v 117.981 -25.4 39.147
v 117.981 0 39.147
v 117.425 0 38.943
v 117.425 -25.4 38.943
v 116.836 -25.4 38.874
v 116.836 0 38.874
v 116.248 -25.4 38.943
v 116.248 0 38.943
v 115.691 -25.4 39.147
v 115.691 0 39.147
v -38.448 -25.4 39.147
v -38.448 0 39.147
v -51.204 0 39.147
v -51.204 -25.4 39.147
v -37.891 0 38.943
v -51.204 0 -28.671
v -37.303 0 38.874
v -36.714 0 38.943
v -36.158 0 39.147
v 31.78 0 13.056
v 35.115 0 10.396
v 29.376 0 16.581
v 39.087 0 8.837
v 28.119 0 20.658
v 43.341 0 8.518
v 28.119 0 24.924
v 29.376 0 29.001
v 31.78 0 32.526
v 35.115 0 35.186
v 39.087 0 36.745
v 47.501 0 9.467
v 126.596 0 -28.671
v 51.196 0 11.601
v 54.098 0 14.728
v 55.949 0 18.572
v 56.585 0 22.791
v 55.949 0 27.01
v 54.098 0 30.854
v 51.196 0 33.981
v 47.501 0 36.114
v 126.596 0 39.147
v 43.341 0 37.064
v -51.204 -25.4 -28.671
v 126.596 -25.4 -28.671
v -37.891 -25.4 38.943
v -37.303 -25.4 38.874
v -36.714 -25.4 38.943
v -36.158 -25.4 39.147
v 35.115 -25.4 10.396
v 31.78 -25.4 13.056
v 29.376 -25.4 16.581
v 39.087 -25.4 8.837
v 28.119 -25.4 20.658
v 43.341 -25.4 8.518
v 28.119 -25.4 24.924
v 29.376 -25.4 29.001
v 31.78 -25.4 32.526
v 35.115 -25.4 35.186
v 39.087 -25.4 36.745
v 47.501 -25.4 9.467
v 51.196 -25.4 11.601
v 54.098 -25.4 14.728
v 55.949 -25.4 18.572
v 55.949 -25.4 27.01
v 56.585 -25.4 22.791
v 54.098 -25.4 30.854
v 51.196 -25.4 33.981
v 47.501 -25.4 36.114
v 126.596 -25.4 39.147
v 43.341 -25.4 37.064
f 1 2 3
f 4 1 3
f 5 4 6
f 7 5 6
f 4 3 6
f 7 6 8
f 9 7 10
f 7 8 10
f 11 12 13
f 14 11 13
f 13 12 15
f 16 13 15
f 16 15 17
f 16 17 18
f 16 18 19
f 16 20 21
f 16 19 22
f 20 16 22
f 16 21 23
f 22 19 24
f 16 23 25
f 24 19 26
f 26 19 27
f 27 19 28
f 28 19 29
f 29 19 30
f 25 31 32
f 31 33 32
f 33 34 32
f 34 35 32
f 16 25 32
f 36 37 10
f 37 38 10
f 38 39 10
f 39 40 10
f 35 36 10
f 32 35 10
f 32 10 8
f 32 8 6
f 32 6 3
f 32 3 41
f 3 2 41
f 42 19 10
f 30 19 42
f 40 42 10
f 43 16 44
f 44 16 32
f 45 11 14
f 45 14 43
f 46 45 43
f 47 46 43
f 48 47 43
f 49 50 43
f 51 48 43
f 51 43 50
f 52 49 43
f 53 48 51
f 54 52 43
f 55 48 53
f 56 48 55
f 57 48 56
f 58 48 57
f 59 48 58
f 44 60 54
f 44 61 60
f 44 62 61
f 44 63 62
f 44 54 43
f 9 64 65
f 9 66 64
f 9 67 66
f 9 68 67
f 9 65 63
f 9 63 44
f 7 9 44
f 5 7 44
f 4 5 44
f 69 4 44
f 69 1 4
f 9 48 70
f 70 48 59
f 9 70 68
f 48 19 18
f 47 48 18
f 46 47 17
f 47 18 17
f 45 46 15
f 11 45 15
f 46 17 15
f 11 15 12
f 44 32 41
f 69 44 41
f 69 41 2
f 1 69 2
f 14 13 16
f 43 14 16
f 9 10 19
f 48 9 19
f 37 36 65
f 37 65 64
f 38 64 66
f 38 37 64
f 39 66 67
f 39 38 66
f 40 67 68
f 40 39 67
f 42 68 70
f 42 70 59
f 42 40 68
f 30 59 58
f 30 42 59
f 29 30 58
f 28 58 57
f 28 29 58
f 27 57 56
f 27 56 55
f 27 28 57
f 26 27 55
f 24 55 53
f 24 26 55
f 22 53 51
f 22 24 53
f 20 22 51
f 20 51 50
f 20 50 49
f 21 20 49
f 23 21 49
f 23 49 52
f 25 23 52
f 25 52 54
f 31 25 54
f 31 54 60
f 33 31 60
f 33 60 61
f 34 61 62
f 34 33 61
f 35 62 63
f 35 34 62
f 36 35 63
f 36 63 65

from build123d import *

# Parameters (mm, degrees)
F0_R     = 14.3129
F1_DEPTH = 25.4


with BuildPart() as f1:
    # F0 (on Front) → F1 (new body)
    with BuildSketch(Plane.XZ):
        with BuildLine():
            Line((-38.447507, 39.146728), (-51.203564, 39.146728))
            Line((-51.203564, 39.146728), (-51.203564, -28.671272))
            Line((-51.203564, -28.671272), (126.596436, -28.671272))
            Line((126.596436, -28.671272), (126.596436, 39.146728))
            Line((126.596436, 39.146728), (117.981013, 39.146728))
            ThreePointArc((117.981013, 39.146728), (116.836108, 38.87406), (115.691204, 39.146728))
            Line((115.691204, 39.146728), (-36.157697, 39.146728))
            ThreePointArc((-36.157697, 39.146728), (-37.302602, 38.87406), (-38.447507, 39.146728))
        make_face()
        with Locations((42.271748, 22.790955)):
            Circle(F0_R, mode=Mode.SUBTRACT)
    extrude(amount=F1_DEPTH)


solid = f1.part
